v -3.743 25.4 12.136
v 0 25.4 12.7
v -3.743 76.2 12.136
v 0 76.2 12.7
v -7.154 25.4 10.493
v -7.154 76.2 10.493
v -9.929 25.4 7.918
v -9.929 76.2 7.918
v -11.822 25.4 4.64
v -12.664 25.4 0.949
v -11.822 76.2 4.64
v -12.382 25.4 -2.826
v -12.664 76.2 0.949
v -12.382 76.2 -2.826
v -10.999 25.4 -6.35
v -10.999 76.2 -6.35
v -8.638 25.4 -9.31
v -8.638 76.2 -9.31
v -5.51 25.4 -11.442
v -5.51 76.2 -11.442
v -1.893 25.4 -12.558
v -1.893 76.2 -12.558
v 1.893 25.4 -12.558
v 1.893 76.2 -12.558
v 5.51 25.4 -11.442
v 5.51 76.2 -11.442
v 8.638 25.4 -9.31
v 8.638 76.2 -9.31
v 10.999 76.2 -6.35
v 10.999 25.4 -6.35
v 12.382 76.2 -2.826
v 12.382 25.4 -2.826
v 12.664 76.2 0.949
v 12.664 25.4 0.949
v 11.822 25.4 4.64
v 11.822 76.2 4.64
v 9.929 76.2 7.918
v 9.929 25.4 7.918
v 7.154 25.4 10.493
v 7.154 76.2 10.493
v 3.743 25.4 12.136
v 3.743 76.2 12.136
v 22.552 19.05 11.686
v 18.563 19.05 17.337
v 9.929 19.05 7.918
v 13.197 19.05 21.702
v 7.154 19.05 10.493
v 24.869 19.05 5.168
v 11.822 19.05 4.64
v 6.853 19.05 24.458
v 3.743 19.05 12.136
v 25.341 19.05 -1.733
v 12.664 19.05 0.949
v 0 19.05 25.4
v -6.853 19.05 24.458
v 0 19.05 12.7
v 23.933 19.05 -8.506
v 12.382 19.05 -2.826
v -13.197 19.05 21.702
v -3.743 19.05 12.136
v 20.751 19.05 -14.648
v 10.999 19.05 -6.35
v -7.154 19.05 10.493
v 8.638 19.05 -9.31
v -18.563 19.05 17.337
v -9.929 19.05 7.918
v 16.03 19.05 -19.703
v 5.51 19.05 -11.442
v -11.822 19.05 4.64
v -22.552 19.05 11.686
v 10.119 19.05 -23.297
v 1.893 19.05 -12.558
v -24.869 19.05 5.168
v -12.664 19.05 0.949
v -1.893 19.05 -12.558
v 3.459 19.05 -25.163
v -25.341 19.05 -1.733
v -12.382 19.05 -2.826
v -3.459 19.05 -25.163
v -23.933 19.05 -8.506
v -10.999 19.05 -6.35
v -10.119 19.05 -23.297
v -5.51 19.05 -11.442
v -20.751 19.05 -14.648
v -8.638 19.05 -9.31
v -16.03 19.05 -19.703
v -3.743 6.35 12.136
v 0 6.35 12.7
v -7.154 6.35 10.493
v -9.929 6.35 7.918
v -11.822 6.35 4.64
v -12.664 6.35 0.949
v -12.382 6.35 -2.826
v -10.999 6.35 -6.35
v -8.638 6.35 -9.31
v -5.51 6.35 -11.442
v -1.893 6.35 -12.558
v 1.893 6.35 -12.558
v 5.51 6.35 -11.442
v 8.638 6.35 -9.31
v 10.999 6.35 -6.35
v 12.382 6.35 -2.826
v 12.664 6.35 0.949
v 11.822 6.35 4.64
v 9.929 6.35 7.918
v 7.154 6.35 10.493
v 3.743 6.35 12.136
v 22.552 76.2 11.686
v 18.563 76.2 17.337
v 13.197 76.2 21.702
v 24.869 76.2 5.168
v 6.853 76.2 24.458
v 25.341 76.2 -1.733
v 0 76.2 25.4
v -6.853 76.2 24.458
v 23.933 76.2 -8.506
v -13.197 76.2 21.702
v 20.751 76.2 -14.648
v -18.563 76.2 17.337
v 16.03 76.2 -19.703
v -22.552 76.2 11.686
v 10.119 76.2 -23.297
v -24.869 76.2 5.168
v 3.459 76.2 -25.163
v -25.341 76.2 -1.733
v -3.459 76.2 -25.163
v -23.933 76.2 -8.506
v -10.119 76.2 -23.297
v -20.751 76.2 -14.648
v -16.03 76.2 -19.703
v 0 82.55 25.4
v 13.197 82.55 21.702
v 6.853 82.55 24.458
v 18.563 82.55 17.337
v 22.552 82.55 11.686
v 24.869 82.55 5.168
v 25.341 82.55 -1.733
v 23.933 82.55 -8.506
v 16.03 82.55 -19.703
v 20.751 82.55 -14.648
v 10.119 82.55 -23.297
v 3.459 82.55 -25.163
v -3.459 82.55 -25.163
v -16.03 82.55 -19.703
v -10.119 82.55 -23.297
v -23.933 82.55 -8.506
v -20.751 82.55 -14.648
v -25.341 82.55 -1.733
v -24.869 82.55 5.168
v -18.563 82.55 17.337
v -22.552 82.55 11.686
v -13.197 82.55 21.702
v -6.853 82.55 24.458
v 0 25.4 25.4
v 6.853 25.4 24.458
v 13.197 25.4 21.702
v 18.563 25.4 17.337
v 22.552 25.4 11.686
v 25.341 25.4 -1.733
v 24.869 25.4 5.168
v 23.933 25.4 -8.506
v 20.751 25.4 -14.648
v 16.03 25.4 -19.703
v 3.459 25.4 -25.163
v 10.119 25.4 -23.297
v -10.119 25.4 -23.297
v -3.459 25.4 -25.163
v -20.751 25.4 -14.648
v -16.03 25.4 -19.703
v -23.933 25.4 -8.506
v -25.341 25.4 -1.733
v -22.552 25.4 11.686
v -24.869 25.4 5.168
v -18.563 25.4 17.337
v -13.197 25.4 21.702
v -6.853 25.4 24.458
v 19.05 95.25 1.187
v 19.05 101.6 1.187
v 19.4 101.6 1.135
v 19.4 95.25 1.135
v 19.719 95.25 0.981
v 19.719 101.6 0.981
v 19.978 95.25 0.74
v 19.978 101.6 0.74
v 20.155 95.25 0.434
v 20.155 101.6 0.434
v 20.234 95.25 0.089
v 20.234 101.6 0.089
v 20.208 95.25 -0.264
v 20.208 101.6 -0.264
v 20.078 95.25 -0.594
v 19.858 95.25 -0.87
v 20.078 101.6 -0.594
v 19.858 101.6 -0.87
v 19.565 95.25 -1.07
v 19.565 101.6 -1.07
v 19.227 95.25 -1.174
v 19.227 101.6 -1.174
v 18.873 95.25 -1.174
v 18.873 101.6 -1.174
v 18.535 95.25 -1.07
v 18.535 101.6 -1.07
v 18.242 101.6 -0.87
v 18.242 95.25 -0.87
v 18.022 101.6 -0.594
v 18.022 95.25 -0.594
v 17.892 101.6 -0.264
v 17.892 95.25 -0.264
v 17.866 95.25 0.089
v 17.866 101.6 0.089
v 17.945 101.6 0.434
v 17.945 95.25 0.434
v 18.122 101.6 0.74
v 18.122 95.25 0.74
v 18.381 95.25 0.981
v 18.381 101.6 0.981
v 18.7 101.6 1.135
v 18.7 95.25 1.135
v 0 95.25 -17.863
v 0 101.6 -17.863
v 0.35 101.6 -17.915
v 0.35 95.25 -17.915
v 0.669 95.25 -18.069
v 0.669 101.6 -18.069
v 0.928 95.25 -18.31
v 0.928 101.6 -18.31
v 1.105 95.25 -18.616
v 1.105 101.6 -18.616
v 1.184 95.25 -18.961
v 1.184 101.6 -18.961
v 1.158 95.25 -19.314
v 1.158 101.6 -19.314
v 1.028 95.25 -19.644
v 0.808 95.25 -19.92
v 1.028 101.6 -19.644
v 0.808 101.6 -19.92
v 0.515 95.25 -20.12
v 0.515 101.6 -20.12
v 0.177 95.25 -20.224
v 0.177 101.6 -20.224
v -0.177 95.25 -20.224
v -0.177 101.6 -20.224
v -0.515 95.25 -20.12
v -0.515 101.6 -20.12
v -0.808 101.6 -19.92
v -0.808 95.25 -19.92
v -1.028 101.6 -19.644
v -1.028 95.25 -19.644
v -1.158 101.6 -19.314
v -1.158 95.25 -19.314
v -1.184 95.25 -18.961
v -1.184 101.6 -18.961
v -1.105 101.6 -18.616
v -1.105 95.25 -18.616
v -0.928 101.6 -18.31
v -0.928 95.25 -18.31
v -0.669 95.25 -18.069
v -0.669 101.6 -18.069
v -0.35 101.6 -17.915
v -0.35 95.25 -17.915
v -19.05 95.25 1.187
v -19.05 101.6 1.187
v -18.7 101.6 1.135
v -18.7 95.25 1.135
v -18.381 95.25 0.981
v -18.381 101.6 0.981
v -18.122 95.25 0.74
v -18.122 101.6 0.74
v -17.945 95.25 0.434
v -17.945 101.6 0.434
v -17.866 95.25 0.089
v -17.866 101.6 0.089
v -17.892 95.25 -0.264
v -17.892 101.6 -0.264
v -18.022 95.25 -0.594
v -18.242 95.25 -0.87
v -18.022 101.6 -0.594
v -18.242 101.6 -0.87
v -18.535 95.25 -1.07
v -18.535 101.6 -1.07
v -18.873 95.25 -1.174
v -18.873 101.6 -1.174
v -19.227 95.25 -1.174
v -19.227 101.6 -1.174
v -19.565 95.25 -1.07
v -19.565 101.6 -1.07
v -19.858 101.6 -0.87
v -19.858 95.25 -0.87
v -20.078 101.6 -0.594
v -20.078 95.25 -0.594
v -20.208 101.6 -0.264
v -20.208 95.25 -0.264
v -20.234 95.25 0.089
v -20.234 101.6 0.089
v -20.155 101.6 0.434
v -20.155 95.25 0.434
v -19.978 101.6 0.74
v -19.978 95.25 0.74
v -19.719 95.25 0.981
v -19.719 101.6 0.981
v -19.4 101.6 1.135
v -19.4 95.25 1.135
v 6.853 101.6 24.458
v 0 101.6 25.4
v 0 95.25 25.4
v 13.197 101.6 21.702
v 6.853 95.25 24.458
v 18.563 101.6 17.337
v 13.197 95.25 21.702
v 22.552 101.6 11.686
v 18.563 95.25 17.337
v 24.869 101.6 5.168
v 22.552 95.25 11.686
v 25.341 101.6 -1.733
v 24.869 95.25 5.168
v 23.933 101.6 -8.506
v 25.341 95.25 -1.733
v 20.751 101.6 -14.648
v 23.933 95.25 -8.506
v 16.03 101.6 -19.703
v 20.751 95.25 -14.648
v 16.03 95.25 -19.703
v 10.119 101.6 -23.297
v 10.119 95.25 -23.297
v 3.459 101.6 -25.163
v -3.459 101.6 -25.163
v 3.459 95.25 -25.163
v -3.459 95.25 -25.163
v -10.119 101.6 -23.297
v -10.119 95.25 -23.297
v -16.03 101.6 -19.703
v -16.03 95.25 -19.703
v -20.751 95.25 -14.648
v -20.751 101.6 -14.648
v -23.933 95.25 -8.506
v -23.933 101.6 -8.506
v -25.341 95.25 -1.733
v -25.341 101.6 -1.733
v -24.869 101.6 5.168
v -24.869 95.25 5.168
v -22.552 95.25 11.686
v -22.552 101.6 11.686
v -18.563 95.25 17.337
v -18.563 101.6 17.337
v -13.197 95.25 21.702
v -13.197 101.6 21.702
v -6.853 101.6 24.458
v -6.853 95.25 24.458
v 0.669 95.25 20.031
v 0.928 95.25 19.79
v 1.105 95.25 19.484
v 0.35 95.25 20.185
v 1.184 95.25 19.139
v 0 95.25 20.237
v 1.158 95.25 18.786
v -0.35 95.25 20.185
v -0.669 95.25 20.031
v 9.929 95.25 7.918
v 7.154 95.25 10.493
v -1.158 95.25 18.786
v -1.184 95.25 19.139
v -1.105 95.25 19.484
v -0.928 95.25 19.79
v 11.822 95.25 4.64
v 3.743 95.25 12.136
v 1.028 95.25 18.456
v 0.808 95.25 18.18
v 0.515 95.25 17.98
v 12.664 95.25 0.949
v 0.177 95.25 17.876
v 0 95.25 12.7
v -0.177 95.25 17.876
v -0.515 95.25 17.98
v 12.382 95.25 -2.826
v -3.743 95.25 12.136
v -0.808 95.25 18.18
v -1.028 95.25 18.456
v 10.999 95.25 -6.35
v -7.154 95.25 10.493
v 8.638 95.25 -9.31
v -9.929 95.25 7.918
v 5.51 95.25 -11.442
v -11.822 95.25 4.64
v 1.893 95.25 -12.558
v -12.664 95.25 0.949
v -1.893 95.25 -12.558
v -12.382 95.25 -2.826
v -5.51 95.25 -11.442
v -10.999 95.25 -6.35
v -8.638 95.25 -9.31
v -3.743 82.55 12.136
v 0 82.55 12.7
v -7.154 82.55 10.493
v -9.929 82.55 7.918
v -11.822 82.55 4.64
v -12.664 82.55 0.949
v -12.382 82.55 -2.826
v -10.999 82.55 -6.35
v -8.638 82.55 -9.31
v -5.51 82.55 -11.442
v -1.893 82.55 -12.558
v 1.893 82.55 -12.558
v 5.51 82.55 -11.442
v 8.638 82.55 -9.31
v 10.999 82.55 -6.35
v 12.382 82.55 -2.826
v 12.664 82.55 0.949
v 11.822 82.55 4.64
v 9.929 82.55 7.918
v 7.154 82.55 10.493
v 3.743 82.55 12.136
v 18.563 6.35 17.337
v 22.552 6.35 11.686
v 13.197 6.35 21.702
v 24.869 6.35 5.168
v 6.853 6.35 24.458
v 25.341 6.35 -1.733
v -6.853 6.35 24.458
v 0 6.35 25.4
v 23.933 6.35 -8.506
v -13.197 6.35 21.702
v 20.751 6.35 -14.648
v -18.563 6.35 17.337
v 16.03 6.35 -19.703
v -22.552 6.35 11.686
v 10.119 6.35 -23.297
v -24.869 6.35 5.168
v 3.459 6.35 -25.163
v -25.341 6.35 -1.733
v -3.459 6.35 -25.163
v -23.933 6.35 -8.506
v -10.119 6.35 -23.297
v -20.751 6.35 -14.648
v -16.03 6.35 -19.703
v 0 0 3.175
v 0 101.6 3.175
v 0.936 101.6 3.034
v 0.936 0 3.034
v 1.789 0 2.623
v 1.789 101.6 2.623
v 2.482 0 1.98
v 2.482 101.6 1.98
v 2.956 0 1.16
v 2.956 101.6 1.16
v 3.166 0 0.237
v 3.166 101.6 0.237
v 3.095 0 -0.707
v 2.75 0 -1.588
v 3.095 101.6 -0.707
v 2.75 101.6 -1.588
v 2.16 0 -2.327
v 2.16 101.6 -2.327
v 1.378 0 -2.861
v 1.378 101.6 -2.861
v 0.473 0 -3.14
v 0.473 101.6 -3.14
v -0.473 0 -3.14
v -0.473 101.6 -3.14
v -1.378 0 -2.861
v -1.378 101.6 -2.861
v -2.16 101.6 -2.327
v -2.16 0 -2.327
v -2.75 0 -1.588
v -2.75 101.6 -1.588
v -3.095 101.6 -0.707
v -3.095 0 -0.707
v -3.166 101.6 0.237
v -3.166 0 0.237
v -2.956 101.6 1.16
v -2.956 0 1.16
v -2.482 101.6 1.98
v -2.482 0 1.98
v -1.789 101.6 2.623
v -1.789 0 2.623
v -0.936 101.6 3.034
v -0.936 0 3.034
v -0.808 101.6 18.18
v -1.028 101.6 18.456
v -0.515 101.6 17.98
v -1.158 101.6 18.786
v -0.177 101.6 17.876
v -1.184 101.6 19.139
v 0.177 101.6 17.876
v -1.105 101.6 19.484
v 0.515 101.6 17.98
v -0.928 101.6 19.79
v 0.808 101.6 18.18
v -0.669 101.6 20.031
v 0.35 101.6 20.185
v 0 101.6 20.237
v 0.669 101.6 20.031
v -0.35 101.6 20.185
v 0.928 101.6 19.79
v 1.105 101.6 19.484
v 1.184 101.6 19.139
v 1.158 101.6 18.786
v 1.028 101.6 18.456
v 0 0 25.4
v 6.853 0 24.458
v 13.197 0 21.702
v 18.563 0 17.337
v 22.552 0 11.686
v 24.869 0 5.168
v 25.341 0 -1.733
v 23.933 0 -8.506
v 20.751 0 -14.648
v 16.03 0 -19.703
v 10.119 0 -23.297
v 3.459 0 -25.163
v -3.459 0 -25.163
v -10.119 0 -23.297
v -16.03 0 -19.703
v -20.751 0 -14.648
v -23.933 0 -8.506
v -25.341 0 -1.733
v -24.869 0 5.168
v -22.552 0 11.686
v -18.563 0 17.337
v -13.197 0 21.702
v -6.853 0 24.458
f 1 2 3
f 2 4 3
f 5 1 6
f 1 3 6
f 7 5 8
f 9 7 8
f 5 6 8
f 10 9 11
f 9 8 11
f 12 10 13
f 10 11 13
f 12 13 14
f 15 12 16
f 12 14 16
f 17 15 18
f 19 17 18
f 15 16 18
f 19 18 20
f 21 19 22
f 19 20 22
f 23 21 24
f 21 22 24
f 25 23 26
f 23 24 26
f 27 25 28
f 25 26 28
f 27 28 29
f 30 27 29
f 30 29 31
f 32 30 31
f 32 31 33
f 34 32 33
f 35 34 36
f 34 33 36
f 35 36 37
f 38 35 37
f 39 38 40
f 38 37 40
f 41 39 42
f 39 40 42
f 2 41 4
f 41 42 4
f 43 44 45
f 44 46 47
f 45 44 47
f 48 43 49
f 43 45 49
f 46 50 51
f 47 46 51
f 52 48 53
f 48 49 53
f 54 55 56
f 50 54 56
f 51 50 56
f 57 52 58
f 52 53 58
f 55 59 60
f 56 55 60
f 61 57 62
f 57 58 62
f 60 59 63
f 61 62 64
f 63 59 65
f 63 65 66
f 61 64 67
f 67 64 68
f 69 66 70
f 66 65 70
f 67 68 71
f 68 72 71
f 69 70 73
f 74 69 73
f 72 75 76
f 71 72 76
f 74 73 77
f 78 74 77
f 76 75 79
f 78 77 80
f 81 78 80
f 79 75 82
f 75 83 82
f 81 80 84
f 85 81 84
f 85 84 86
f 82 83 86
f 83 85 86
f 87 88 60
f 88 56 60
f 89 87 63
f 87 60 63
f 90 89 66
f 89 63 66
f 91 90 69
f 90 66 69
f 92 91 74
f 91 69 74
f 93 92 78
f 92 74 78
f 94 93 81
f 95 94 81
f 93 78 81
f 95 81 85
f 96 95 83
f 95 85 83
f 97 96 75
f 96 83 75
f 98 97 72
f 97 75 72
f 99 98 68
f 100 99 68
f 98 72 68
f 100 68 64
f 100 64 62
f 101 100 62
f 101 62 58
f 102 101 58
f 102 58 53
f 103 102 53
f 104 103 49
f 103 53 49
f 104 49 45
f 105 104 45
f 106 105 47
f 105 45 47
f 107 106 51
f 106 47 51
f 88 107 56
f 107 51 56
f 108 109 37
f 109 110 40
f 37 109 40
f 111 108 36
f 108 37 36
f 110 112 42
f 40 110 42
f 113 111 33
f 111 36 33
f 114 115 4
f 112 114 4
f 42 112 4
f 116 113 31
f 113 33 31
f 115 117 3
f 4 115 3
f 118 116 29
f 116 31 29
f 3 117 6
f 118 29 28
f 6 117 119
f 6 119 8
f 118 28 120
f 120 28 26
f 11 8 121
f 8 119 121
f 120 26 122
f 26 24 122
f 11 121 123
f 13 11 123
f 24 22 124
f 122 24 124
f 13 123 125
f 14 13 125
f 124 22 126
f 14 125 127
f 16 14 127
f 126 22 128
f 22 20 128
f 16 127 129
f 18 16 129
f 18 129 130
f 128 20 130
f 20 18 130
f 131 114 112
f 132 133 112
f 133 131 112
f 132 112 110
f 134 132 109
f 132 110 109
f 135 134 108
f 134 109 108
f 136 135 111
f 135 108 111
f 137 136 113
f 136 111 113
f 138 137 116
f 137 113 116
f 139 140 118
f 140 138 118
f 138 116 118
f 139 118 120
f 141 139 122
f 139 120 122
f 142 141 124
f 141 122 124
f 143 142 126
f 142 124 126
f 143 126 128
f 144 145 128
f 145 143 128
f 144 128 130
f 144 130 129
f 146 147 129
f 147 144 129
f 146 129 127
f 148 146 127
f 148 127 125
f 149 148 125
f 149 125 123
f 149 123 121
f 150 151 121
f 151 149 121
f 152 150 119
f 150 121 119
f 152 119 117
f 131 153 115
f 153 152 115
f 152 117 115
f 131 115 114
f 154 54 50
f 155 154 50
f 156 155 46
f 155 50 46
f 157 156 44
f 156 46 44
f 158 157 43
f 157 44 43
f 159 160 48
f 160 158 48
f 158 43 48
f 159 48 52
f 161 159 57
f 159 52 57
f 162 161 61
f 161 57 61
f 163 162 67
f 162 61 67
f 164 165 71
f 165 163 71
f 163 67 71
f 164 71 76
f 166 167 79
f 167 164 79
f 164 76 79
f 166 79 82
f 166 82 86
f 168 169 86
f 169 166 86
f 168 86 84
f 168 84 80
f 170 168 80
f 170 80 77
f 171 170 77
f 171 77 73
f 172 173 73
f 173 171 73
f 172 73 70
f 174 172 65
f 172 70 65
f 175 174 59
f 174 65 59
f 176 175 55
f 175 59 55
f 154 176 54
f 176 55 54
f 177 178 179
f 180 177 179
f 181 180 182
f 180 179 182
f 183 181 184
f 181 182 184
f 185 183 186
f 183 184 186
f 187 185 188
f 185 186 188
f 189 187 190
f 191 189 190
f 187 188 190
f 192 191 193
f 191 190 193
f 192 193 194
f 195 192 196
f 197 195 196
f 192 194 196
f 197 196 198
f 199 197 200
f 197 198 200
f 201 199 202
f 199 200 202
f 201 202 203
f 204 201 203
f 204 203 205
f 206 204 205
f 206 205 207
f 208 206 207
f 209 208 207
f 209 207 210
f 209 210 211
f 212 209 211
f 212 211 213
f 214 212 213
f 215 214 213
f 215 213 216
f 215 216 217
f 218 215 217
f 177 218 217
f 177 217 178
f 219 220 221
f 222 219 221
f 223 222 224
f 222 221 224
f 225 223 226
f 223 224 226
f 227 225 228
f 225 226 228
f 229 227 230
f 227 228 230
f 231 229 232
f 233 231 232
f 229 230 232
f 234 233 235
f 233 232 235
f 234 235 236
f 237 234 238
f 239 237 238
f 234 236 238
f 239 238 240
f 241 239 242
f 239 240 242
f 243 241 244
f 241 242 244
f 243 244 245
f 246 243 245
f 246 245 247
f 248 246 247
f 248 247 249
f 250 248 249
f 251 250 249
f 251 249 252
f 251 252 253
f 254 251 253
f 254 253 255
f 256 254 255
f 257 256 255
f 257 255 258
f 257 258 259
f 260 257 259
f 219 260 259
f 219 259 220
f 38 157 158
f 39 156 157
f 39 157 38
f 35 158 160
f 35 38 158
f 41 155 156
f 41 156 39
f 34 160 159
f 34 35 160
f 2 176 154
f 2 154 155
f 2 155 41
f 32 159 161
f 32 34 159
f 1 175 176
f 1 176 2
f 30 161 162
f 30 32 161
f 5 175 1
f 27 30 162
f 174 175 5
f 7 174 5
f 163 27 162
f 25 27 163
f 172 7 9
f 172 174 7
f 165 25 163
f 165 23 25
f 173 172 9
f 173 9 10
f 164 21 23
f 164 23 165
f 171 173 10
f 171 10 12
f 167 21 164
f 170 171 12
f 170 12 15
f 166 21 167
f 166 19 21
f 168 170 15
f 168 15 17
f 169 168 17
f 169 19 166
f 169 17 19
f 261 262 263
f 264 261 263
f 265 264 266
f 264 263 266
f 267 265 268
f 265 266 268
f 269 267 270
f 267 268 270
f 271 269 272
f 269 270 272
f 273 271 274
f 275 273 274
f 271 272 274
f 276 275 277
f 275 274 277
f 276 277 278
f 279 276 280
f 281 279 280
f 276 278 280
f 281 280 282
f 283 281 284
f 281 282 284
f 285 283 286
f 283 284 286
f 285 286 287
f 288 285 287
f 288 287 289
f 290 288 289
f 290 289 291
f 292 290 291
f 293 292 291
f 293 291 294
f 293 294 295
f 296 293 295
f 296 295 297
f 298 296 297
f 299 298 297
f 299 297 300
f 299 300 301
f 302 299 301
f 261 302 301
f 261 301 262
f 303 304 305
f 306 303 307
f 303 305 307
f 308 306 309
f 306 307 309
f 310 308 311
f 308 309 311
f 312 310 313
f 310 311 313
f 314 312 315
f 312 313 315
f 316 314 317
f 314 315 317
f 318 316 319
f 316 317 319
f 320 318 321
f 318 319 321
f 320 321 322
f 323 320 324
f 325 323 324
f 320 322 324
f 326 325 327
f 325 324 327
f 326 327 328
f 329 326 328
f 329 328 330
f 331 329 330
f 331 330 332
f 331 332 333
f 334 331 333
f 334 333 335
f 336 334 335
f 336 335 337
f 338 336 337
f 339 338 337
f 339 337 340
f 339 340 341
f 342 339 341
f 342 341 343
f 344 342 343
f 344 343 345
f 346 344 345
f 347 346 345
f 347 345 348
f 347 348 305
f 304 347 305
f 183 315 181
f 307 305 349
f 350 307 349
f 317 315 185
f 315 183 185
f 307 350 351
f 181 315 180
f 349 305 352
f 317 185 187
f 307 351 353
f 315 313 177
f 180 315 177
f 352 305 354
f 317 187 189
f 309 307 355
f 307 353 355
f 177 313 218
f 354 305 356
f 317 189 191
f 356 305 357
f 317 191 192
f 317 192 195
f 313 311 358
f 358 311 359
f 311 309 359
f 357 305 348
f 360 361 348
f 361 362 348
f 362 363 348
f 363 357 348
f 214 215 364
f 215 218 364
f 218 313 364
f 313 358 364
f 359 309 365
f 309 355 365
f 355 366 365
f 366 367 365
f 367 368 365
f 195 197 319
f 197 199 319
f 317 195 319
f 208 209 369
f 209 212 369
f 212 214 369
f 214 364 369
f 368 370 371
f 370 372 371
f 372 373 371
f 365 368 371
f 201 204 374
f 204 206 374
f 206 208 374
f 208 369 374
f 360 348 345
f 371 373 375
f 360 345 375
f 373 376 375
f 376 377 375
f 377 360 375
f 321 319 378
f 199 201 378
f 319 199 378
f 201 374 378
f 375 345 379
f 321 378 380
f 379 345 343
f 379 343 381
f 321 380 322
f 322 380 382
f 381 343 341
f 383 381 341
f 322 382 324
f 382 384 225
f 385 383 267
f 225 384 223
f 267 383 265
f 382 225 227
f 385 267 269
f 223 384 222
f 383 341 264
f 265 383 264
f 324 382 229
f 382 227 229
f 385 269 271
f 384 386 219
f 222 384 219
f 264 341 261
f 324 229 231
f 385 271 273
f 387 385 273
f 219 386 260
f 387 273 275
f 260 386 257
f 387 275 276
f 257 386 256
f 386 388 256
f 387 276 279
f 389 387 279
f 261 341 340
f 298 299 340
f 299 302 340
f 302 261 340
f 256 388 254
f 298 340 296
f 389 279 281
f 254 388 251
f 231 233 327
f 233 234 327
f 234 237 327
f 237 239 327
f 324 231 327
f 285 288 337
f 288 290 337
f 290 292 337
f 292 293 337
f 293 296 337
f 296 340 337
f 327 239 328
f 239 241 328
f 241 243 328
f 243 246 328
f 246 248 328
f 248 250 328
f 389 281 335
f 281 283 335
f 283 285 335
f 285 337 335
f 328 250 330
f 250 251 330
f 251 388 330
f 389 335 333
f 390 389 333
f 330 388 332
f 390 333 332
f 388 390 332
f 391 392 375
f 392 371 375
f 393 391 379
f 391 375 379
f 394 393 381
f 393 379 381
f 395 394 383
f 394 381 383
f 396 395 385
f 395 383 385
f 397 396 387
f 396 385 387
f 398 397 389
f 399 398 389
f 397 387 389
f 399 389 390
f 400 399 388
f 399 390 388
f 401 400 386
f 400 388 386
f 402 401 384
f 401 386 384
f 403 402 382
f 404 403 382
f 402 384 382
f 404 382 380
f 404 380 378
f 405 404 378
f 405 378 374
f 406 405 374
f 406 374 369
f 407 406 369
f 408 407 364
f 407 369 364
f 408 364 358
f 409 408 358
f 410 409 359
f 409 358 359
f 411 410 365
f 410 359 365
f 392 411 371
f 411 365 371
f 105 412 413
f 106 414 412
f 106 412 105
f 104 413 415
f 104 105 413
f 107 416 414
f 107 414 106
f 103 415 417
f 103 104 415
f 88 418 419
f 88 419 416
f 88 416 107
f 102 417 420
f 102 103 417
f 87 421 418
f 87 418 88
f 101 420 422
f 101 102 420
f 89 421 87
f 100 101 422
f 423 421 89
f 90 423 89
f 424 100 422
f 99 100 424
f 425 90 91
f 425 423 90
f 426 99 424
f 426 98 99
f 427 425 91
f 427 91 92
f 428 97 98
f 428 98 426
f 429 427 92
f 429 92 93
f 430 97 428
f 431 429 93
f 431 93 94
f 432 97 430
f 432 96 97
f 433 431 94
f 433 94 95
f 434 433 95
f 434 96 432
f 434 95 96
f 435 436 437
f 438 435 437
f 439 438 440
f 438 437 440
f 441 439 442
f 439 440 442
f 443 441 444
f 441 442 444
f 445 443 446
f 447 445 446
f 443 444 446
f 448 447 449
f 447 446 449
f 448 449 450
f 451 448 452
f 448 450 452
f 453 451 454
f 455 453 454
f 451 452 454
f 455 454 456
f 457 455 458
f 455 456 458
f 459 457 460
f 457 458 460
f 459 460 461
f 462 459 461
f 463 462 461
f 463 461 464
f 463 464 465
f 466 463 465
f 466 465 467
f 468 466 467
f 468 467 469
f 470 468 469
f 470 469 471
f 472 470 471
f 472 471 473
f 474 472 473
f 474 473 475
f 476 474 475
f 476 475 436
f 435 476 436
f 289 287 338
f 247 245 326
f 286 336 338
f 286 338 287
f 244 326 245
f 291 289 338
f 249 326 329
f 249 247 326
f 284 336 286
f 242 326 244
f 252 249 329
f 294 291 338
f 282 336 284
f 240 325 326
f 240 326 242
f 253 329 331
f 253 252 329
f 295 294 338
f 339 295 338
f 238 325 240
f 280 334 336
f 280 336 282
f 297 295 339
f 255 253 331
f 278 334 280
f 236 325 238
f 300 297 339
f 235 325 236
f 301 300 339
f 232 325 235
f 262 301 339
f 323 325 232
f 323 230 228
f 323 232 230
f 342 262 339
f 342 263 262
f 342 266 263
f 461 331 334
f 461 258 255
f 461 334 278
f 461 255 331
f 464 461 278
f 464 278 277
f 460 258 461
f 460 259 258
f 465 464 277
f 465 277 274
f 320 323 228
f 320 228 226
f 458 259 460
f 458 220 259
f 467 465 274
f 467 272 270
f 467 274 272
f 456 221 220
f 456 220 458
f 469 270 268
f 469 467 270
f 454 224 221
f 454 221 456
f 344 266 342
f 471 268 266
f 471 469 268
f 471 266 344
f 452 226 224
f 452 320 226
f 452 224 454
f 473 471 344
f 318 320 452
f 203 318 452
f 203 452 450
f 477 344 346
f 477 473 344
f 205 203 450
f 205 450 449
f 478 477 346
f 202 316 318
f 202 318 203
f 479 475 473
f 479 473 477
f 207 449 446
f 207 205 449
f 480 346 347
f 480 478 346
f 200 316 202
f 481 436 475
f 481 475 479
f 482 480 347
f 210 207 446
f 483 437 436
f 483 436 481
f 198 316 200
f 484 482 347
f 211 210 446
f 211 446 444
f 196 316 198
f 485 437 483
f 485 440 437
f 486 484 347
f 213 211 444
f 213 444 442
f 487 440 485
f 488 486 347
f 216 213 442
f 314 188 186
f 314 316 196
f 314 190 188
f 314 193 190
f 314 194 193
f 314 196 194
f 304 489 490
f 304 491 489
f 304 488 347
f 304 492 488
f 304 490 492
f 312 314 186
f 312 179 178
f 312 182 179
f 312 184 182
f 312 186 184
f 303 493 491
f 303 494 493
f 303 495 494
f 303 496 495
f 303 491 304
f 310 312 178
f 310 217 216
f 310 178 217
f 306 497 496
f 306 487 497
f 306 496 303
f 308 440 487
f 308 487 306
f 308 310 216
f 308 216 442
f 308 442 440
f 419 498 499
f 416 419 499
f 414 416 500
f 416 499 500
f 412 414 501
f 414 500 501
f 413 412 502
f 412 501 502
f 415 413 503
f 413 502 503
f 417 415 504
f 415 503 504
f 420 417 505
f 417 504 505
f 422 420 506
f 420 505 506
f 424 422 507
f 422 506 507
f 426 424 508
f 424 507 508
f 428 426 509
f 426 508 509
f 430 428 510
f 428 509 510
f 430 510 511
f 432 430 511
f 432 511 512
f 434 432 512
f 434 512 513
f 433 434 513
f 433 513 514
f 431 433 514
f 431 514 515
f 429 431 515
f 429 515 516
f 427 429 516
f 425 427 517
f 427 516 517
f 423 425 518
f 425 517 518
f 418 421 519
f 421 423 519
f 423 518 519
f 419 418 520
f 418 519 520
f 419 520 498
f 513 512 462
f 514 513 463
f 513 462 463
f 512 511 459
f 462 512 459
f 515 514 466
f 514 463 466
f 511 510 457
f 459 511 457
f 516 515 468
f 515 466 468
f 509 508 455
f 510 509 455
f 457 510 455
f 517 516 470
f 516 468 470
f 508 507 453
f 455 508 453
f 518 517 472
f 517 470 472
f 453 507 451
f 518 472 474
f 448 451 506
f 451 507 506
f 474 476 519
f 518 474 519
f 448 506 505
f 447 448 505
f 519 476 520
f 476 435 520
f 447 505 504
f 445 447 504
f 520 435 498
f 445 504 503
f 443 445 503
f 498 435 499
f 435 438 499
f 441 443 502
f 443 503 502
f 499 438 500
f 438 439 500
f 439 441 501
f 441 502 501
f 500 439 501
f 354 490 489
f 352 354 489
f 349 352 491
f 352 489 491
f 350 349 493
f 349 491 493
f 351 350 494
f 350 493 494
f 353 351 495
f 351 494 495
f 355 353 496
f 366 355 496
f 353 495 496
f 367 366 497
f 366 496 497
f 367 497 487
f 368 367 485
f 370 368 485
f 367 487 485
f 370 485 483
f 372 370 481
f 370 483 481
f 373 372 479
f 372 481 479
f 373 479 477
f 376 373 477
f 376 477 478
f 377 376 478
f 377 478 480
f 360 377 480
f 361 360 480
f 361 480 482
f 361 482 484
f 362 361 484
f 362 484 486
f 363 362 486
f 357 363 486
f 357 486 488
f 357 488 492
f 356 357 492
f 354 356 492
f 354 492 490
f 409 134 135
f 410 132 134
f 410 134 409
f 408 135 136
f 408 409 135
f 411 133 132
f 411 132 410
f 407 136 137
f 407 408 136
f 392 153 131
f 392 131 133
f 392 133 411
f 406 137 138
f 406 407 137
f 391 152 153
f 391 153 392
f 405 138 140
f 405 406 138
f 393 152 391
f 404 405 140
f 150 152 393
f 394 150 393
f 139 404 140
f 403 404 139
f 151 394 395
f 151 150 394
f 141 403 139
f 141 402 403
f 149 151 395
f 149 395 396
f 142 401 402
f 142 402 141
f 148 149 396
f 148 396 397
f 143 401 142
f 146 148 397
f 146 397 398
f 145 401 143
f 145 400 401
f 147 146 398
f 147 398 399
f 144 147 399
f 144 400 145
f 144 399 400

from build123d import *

# Parameters (mm, degrees)
SKETCH1_R           = 25.4
BOSS_EXTRUDE1_DEPTH = 101.6
SKETCH2_W           = 12.7
SKETCH2_H           = 12.7
SKETCH2_H_2         = 50.8
CUT_EXTRUDE1_REACH  = 109.763
SKETCH3_R           = 3.175
CUT_EXTRUDE2_REACH  = 109.763
SKETCH4_R           = 1.18745


with BuildPart() as part:
    # Sketch1 → Boss-Extrude1 (new body)
    with BuildSketch(Plane(origin=(0, 0, 0), x_dir=(1, 0, 0), z_dir=(0, 1, 0))):
        with Locations(Location((0, 0, 0), (0, 0, 270))):
            Circle(SKETCH1_R)
    extrude(amount=BOSS_EXTRUDE1_DEPTH)

    # Sketch2 → Cut-Revolve1 (revolve, cut)
    with BuildSketch(Plane(origin=(0, 0, 0), x_dir=(0, 0, -1), z_dir=(1, 0, 0)), mode=Mode.PRIVATE) as cut_revolve1_sk:
        with Locations((19.05, 88.9)):
            Rectangle(SKETCH2_W, SKETCH2_H)
        with Locations((19.05, 12.7)):
            Rectangle(SKETCH2_W, SKETCH2_H)
        with Locations((19.05, 50.8)):
            Rectangle(SKETCH2_W, SKETCH2_H_2)
    revolve(cut_revolve1_sk.sketch.rotate(Axis((0, 101.6, 0), (0, -1, 0)), 180), axis=Axis((0, 101.6, 0), (0, -1, 0)), mode=Mode.SUBTRACT)

    # Sketch3 → Cut-Extrude1 (cut, up to next)
    with BuildSketch(Plane(origin=(0, 101.6, 0), x_dir=(1, 0, 0), z_dir=(0, 1, 0)), mode=Mode.PRIVATE) as cut_extrude1_sk1:
        with Locations(Location((0, 0, 0), (0, 0, 270))):
            Circle(SKETCH3_R)
    cut_extrude1_tool1 = extrude(cut_extrude1_sk1.sketch, amount=-CUT_EXTRUDE1_REACH, mode=Mode.PRIVATE) & part.part
    add(cut_extrude1_tool1.solids().sort_by_distance((0, 101.6, 0))[0], mode=Mode.SUBTRACT)

    # Sketch4 → Cut-Extrude2 (cut, up to next)
    with BuildSketch(Plane(origin=(0, 101.6, 0), x_dir=(1, 0, 0), z_dir=(0, 1, 0)), mode=Mode.PRIVATE) as cut_extrude2_sk1:
        with Locations(Location((-19.05, 0, 0), (0, 0, 270))):
            Circle(SKETCH4_R)
    cut_extrude2_tool1 = extrude(cut_extrude2_sk1.sketch, amount=-CUT_EXTRUDE2_REACH, mode=Mode.PRIVATE) & part.part
    # Sketch4 → Cut-Extrude2 (cut, up to next)
    with BuildSketch(Plane(origin=(0, 101.6, 0), x_dir=(1, 0, 0), z_dir=(0, 1, 0)), mode=Mode.PRIVATE) as cut_extrude2_sk2:
        with Locations(Location((0, 19.05, 0), (0, 0, 270))):
            Circle(SKETCH4_R)
    cut_extrude2_tool2 = extrude(cut_extrude2_sk2.sketch, amount=-CUT_EXTRUDE2_REACH, mode=Mode.PRIVATE) & part.part
    # Sketch4 → Cut-Extrude2 (cut, up to next)
    with BuildSketch(Plane(origin=(0, 101.6, 0), x_dir=(1, 0, 0), z_dir=(0, 1, 0)), mode=Mode.PRIVATE) as cut_extrude2_sk3:
        with Locations(Location((19.05, 0, 0), (0, 0, 270))):
            Circle(SKETCH4_R)
    cut_extrude2_tool3 = extrude(cut_extrude2_sk3.sketch, amount=-CUT_EXTRUDE2_REACH, mode=Mode.PRIVATE) & part.part
    # Sketch4 → Cut-Extrude2 (cut, up to next)
    with BuildSketch(Plane(origin=(0, 101.6, 0), x_dir=(1, 0, 0), z_dir=(0, 1, 0)), mode=Mode.PRIVATE) as cut_extrude2_sk4:
        with Locations(Location((0, -19.05, 0), (0, 0, 270))):
            Circle(SKETCH4_R)
    cut_extrude2_tool4 = extrude(cut_extrude2_sk4.sketch, amount=-CUT_EXTRUDE2_REACH, mode=Mode.PRIVATE) & part.part
    add(cut_extrude2_tool1.solids().sort_by_distance((-19.05, 101.6, 0))[0], mode=Mode.SUBTRACT)
    add(cut_extrude2_tool2.solids().sort_by_distance((0, 101.6, -19.05))[0], mode=Mode.SUBTRACT)
    add(cut_extrude2_tool3.solids().sort_by_distance((19.05, 101.6, 0))[0], mode=Mode.SUBTRACT)
    add(cut_extrude2_tool4.solids().sort_by_distance((0, 101.6, 19.05))[0], mode=Mode.SUBTRACT)


solid = part.part
